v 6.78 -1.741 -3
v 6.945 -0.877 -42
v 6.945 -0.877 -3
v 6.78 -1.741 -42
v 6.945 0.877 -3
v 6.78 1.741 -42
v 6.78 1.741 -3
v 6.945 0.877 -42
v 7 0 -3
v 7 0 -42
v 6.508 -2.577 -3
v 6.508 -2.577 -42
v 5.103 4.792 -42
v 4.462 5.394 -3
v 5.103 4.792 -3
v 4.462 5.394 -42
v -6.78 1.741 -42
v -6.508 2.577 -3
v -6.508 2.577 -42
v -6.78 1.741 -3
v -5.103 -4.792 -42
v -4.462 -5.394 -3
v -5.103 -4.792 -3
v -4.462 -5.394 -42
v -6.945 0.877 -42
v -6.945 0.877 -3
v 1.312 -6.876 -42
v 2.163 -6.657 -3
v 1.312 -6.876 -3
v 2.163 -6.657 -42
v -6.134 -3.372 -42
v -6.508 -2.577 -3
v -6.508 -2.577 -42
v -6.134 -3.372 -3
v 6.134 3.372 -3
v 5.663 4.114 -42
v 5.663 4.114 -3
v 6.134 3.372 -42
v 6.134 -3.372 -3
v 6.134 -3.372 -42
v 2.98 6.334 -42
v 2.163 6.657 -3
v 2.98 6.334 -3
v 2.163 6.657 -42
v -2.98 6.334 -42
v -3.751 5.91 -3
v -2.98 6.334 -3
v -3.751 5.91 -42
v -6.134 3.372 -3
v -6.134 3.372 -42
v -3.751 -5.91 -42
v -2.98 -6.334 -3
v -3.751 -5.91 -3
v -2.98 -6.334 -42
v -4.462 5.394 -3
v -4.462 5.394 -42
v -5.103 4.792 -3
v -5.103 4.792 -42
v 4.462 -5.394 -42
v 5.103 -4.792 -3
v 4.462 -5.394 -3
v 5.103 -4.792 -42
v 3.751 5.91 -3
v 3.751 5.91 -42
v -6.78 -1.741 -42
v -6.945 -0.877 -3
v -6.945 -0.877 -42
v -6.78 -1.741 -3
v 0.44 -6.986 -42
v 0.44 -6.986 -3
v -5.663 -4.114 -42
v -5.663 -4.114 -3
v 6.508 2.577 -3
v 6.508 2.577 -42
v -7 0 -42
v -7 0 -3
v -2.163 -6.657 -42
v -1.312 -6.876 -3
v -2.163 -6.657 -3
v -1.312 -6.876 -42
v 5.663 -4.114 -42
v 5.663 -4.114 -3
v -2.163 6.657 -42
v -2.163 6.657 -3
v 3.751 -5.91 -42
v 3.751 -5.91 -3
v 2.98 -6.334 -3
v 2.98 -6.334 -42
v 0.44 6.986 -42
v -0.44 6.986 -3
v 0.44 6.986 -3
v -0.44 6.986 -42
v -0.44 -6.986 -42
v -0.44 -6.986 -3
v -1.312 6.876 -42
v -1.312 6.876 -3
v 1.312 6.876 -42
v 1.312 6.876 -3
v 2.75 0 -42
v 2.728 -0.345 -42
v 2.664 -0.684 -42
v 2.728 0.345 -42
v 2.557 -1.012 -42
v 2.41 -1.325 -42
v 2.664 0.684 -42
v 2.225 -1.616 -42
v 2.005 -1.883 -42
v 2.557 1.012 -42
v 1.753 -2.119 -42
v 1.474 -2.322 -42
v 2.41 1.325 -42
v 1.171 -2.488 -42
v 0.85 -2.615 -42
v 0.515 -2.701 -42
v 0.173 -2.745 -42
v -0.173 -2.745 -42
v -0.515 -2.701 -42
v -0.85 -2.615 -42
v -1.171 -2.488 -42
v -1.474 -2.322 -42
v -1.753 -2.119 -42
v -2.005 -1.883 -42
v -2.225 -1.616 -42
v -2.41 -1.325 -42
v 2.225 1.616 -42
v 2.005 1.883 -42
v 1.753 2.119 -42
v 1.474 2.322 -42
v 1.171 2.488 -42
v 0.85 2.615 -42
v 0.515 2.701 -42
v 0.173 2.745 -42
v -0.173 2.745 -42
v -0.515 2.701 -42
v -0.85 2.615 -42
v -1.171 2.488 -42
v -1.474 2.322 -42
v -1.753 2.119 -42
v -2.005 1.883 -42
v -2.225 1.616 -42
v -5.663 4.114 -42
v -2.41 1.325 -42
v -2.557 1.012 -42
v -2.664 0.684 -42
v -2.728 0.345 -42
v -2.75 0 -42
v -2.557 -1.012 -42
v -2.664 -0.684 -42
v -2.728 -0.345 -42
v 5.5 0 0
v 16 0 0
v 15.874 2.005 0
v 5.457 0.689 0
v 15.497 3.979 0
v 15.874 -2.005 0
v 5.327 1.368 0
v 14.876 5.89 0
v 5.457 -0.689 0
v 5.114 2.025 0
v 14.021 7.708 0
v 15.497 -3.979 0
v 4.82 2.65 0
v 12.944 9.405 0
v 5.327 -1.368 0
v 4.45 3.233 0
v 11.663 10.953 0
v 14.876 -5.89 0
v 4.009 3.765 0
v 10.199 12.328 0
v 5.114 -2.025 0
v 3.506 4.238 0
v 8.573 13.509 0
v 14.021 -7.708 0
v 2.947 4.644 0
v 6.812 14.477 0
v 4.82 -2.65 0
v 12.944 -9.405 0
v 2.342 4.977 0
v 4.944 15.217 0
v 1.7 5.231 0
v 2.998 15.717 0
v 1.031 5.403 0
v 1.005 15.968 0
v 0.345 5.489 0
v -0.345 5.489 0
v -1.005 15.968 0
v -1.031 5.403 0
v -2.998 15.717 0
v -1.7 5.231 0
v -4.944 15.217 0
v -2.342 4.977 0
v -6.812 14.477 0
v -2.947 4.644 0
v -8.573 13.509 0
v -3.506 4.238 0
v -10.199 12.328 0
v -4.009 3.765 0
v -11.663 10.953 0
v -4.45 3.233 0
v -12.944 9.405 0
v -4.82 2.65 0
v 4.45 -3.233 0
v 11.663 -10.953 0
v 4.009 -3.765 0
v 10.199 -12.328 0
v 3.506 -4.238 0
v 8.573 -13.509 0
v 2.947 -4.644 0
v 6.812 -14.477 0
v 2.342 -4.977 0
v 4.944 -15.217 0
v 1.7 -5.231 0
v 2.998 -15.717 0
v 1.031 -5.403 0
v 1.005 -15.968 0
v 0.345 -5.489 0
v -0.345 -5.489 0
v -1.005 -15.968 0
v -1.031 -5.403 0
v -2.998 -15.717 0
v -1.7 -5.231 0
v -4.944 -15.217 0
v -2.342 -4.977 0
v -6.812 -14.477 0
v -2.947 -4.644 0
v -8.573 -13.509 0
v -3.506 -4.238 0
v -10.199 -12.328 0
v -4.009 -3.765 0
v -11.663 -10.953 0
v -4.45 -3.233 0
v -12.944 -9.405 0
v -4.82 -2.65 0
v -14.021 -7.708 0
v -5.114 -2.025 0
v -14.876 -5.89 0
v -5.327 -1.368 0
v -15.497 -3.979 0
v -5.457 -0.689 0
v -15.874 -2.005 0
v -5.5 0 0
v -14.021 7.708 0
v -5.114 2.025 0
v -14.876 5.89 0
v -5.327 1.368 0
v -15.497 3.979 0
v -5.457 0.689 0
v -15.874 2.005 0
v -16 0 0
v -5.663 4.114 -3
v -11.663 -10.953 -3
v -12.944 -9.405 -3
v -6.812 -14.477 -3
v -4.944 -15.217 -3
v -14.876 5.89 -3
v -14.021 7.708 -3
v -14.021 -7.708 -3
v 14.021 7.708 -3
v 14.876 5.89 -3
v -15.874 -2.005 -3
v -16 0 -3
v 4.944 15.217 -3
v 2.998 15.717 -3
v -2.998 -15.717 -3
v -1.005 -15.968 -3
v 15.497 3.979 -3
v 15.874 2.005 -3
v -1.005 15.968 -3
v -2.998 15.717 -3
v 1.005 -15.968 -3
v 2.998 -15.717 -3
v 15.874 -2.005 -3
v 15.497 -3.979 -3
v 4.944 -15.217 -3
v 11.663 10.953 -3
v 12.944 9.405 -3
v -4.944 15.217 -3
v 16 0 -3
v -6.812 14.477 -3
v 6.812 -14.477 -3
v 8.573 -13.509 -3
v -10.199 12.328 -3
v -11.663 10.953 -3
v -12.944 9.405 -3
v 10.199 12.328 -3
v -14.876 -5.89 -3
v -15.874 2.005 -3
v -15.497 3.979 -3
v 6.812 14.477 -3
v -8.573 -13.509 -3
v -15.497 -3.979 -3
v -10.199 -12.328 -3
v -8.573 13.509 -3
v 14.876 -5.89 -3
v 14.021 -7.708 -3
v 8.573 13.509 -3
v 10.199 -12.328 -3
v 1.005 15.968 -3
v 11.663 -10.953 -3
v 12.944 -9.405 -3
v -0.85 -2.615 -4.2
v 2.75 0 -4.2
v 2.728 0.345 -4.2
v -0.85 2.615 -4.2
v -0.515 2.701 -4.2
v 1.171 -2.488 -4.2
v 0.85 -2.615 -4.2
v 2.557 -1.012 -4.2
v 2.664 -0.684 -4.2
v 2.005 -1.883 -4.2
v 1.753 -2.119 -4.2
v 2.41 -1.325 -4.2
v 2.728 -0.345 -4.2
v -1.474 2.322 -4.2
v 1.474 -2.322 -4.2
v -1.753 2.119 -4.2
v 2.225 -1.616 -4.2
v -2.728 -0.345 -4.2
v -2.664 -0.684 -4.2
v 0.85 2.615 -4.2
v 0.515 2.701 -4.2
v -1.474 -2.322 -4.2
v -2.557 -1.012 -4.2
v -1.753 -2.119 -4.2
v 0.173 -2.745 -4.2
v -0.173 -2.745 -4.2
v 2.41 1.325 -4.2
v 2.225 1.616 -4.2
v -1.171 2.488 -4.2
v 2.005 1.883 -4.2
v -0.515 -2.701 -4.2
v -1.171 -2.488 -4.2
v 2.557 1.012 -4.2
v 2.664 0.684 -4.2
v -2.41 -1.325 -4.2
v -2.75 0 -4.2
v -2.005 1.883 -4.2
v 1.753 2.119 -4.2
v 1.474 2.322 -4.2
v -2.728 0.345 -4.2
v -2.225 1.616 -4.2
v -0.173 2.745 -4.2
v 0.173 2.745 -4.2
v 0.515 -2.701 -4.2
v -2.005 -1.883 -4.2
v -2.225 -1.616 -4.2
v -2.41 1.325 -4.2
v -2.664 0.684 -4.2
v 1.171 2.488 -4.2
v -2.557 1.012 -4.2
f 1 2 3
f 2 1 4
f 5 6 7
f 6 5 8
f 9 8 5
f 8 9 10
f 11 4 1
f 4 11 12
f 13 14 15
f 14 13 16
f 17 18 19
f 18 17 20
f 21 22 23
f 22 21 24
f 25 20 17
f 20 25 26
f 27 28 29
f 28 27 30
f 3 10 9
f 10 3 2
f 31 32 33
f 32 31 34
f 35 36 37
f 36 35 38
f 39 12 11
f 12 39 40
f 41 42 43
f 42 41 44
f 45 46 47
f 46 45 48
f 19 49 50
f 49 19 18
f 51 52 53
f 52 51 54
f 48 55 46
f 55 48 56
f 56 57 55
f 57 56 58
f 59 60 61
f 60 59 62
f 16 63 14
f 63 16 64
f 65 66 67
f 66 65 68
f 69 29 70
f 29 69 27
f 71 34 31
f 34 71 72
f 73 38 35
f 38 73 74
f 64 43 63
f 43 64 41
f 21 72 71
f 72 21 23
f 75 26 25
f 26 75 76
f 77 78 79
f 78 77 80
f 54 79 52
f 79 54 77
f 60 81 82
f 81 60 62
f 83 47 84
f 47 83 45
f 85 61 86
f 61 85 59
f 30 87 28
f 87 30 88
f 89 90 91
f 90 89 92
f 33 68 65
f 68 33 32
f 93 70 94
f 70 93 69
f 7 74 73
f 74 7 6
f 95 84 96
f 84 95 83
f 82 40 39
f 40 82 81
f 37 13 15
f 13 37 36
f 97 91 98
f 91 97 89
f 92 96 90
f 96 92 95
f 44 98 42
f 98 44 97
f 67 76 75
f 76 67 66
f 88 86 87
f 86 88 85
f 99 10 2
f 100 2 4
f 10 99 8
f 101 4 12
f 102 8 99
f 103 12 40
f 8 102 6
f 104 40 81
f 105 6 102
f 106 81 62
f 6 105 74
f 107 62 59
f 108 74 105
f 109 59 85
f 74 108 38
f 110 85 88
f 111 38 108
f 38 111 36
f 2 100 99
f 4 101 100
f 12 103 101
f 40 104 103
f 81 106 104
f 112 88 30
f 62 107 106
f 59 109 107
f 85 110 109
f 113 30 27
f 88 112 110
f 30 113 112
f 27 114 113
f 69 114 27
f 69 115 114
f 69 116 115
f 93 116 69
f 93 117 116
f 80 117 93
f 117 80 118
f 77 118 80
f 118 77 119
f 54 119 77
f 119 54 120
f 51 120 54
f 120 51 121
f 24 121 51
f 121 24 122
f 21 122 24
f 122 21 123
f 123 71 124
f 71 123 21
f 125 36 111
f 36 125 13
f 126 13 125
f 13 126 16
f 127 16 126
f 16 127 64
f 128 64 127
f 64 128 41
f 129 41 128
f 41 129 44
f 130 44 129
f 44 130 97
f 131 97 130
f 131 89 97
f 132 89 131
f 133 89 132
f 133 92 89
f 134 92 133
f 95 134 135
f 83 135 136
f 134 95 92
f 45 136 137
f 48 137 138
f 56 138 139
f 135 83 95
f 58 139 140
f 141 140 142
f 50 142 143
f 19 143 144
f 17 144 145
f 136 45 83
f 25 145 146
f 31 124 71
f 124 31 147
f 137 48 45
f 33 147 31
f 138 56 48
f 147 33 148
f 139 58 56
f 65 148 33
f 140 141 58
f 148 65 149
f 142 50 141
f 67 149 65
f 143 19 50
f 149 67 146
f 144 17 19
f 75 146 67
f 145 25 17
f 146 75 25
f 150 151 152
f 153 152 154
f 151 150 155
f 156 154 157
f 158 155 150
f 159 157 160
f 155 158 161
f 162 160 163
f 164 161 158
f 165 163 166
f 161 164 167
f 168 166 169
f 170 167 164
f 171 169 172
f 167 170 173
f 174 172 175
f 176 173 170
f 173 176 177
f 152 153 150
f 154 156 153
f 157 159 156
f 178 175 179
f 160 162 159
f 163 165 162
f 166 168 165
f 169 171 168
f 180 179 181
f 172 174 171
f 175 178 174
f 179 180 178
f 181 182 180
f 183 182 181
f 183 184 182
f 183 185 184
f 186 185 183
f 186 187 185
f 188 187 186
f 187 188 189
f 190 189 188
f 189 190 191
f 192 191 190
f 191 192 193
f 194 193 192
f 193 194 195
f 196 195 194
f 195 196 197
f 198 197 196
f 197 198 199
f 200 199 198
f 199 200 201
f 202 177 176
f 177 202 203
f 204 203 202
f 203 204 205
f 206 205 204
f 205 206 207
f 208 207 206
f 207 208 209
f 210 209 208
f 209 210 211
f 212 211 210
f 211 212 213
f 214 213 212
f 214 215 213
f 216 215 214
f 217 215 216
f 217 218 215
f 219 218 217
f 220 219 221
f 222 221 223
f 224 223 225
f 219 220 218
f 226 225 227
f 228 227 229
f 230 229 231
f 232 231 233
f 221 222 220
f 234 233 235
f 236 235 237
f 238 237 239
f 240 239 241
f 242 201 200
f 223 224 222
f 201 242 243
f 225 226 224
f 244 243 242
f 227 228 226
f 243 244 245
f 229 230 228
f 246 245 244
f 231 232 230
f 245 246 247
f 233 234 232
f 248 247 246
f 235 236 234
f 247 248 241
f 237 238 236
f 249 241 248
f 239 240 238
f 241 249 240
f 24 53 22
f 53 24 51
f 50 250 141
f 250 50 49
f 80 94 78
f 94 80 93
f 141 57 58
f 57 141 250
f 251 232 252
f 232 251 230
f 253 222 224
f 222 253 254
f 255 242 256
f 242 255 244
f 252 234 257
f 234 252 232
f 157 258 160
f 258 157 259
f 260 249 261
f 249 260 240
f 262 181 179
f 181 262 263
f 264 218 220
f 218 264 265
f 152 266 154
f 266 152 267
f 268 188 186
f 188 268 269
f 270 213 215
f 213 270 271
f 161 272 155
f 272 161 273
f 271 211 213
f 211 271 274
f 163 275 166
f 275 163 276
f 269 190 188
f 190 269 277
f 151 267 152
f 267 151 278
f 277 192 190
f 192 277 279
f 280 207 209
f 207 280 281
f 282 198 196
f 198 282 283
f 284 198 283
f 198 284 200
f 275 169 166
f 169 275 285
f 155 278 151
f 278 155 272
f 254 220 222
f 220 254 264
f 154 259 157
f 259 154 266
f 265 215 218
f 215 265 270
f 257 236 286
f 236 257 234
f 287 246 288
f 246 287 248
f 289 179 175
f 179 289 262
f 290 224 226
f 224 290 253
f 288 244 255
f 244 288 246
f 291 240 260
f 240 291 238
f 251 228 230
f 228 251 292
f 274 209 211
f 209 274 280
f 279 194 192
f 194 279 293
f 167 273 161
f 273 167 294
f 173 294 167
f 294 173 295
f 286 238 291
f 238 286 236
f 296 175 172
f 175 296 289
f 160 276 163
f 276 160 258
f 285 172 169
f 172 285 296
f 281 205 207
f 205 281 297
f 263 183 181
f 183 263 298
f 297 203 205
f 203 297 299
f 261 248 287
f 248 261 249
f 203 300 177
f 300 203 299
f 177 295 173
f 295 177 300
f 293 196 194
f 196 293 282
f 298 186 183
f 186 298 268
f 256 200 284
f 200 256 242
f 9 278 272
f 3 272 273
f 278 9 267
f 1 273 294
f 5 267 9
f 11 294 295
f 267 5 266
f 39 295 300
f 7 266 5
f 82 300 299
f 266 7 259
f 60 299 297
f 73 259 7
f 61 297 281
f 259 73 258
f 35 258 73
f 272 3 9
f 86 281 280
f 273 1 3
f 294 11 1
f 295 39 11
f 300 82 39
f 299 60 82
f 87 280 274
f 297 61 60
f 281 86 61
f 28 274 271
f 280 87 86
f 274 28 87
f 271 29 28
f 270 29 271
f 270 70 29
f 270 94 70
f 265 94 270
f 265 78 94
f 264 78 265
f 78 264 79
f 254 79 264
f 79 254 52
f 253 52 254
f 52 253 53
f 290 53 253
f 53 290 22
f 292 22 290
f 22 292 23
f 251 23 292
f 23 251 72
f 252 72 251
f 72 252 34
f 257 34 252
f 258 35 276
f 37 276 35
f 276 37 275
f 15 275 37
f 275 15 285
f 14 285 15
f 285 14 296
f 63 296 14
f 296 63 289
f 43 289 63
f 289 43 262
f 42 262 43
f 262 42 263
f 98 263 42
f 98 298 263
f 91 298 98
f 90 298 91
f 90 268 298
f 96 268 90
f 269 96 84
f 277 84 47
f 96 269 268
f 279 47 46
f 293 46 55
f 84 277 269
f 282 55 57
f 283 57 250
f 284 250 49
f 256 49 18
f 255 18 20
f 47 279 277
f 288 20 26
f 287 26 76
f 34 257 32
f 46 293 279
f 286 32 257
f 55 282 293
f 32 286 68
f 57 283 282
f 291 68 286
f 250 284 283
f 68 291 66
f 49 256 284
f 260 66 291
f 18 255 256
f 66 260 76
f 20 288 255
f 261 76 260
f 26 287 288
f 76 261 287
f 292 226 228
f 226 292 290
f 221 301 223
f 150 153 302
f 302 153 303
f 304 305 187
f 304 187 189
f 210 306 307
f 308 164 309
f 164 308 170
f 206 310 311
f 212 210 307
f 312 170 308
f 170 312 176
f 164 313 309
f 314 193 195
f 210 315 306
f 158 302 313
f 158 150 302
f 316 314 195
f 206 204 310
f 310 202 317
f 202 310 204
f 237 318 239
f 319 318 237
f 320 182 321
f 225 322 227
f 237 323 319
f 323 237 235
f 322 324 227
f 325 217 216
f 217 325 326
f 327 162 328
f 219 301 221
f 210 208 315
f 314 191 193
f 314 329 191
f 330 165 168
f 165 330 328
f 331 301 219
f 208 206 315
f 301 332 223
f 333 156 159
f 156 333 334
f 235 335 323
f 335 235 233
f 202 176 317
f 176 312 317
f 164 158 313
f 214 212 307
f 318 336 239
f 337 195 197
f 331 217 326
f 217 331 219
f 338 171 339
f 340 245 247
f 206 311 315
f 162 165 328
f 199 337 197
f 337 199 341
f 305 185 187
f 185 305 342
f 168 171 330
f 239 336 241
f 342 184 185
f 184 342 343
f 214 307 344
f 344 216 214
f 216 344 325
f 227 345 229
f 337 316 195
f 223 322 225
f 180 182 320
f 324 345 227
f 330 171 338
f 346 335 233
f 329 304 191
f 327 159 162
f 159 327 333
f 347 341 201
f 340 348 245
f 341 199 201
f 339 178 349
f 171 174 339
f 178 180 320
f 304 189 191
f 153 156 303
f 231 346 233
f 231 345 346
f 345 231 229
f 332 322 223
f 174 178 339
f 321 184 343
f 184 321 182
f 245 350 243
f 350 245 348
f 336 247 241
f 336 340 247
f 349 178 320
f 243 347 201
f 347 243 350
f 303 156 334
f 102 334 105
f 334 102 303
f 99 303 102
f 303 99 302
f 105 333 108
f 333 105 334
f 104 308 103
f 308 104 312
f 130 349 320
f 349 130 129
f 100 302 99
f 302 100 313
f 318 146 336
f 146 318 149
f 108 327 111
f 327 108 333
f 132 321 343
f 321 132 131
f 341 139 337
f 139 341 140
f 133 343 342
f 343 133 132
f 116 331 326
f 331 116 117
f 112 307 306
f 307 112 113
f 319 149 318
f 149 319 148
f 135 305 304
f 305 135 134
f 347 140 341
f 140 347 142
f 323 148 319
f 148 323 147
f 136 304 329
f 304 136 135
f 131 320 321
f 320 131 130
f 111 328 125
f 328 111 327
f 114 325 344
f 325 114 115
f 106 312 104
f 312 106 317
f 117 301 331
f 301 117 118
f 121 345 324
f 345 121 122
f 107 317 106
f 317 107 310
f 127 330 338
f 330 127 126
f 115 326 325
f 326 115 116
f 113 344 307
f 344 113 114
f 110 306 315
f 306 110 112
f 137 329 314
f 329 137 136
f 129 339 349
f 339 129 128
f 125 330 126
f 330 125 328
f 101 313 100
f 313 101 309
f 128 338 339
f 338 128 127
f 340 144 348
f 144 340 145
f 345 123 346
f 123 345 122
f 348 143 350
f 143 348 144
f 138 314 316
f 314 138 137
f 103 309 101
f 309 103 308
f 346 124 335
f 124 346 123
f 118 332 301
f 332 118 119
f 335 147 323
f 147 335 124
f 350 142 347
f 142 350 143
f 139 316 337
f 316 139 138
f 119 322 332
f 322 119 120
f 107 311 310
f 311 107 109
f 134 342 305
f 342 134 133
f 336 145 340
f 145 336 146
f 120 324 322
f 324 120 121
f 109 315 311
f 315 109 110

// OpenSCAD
$fn = 50;


difference() {
	union() {
		translate(v = [0, 0, -42.0000000000]) {
			cylinder(h = 42, r = 7.0000000000);
		}
		translate(v = [0, 0, -3.0000000000]) {
			cylinder(h = 3, r = 16.0000000000);
		}
	}
	union() {
		translate(v = [0, 0, 0]) {
			rotate(a = [0, 0, 0]) {
				difference() {
					union() {
						#translate(v = [0, 0, -42.0000000000]) {
							cylinder(h = 42, r = 2.2500000000);
						}
						#translate(v = [0, 0, -4.2000000000]) {
							cylinder(h = 4.2000000000, r1 = 2.7500000000, r2 = 5.5000000000);
						}
						#translate(v = [0, 0, -42.0000000000]) {
							cylinder(h = 42, r = 2.7500000000);
						}
						#translate(v = [0, 0, -42.0000000000]) {
							cylinder(h = 42, r = 2.2500000000);
						}
					}
					union();
				}
			}
		}
	}
}
